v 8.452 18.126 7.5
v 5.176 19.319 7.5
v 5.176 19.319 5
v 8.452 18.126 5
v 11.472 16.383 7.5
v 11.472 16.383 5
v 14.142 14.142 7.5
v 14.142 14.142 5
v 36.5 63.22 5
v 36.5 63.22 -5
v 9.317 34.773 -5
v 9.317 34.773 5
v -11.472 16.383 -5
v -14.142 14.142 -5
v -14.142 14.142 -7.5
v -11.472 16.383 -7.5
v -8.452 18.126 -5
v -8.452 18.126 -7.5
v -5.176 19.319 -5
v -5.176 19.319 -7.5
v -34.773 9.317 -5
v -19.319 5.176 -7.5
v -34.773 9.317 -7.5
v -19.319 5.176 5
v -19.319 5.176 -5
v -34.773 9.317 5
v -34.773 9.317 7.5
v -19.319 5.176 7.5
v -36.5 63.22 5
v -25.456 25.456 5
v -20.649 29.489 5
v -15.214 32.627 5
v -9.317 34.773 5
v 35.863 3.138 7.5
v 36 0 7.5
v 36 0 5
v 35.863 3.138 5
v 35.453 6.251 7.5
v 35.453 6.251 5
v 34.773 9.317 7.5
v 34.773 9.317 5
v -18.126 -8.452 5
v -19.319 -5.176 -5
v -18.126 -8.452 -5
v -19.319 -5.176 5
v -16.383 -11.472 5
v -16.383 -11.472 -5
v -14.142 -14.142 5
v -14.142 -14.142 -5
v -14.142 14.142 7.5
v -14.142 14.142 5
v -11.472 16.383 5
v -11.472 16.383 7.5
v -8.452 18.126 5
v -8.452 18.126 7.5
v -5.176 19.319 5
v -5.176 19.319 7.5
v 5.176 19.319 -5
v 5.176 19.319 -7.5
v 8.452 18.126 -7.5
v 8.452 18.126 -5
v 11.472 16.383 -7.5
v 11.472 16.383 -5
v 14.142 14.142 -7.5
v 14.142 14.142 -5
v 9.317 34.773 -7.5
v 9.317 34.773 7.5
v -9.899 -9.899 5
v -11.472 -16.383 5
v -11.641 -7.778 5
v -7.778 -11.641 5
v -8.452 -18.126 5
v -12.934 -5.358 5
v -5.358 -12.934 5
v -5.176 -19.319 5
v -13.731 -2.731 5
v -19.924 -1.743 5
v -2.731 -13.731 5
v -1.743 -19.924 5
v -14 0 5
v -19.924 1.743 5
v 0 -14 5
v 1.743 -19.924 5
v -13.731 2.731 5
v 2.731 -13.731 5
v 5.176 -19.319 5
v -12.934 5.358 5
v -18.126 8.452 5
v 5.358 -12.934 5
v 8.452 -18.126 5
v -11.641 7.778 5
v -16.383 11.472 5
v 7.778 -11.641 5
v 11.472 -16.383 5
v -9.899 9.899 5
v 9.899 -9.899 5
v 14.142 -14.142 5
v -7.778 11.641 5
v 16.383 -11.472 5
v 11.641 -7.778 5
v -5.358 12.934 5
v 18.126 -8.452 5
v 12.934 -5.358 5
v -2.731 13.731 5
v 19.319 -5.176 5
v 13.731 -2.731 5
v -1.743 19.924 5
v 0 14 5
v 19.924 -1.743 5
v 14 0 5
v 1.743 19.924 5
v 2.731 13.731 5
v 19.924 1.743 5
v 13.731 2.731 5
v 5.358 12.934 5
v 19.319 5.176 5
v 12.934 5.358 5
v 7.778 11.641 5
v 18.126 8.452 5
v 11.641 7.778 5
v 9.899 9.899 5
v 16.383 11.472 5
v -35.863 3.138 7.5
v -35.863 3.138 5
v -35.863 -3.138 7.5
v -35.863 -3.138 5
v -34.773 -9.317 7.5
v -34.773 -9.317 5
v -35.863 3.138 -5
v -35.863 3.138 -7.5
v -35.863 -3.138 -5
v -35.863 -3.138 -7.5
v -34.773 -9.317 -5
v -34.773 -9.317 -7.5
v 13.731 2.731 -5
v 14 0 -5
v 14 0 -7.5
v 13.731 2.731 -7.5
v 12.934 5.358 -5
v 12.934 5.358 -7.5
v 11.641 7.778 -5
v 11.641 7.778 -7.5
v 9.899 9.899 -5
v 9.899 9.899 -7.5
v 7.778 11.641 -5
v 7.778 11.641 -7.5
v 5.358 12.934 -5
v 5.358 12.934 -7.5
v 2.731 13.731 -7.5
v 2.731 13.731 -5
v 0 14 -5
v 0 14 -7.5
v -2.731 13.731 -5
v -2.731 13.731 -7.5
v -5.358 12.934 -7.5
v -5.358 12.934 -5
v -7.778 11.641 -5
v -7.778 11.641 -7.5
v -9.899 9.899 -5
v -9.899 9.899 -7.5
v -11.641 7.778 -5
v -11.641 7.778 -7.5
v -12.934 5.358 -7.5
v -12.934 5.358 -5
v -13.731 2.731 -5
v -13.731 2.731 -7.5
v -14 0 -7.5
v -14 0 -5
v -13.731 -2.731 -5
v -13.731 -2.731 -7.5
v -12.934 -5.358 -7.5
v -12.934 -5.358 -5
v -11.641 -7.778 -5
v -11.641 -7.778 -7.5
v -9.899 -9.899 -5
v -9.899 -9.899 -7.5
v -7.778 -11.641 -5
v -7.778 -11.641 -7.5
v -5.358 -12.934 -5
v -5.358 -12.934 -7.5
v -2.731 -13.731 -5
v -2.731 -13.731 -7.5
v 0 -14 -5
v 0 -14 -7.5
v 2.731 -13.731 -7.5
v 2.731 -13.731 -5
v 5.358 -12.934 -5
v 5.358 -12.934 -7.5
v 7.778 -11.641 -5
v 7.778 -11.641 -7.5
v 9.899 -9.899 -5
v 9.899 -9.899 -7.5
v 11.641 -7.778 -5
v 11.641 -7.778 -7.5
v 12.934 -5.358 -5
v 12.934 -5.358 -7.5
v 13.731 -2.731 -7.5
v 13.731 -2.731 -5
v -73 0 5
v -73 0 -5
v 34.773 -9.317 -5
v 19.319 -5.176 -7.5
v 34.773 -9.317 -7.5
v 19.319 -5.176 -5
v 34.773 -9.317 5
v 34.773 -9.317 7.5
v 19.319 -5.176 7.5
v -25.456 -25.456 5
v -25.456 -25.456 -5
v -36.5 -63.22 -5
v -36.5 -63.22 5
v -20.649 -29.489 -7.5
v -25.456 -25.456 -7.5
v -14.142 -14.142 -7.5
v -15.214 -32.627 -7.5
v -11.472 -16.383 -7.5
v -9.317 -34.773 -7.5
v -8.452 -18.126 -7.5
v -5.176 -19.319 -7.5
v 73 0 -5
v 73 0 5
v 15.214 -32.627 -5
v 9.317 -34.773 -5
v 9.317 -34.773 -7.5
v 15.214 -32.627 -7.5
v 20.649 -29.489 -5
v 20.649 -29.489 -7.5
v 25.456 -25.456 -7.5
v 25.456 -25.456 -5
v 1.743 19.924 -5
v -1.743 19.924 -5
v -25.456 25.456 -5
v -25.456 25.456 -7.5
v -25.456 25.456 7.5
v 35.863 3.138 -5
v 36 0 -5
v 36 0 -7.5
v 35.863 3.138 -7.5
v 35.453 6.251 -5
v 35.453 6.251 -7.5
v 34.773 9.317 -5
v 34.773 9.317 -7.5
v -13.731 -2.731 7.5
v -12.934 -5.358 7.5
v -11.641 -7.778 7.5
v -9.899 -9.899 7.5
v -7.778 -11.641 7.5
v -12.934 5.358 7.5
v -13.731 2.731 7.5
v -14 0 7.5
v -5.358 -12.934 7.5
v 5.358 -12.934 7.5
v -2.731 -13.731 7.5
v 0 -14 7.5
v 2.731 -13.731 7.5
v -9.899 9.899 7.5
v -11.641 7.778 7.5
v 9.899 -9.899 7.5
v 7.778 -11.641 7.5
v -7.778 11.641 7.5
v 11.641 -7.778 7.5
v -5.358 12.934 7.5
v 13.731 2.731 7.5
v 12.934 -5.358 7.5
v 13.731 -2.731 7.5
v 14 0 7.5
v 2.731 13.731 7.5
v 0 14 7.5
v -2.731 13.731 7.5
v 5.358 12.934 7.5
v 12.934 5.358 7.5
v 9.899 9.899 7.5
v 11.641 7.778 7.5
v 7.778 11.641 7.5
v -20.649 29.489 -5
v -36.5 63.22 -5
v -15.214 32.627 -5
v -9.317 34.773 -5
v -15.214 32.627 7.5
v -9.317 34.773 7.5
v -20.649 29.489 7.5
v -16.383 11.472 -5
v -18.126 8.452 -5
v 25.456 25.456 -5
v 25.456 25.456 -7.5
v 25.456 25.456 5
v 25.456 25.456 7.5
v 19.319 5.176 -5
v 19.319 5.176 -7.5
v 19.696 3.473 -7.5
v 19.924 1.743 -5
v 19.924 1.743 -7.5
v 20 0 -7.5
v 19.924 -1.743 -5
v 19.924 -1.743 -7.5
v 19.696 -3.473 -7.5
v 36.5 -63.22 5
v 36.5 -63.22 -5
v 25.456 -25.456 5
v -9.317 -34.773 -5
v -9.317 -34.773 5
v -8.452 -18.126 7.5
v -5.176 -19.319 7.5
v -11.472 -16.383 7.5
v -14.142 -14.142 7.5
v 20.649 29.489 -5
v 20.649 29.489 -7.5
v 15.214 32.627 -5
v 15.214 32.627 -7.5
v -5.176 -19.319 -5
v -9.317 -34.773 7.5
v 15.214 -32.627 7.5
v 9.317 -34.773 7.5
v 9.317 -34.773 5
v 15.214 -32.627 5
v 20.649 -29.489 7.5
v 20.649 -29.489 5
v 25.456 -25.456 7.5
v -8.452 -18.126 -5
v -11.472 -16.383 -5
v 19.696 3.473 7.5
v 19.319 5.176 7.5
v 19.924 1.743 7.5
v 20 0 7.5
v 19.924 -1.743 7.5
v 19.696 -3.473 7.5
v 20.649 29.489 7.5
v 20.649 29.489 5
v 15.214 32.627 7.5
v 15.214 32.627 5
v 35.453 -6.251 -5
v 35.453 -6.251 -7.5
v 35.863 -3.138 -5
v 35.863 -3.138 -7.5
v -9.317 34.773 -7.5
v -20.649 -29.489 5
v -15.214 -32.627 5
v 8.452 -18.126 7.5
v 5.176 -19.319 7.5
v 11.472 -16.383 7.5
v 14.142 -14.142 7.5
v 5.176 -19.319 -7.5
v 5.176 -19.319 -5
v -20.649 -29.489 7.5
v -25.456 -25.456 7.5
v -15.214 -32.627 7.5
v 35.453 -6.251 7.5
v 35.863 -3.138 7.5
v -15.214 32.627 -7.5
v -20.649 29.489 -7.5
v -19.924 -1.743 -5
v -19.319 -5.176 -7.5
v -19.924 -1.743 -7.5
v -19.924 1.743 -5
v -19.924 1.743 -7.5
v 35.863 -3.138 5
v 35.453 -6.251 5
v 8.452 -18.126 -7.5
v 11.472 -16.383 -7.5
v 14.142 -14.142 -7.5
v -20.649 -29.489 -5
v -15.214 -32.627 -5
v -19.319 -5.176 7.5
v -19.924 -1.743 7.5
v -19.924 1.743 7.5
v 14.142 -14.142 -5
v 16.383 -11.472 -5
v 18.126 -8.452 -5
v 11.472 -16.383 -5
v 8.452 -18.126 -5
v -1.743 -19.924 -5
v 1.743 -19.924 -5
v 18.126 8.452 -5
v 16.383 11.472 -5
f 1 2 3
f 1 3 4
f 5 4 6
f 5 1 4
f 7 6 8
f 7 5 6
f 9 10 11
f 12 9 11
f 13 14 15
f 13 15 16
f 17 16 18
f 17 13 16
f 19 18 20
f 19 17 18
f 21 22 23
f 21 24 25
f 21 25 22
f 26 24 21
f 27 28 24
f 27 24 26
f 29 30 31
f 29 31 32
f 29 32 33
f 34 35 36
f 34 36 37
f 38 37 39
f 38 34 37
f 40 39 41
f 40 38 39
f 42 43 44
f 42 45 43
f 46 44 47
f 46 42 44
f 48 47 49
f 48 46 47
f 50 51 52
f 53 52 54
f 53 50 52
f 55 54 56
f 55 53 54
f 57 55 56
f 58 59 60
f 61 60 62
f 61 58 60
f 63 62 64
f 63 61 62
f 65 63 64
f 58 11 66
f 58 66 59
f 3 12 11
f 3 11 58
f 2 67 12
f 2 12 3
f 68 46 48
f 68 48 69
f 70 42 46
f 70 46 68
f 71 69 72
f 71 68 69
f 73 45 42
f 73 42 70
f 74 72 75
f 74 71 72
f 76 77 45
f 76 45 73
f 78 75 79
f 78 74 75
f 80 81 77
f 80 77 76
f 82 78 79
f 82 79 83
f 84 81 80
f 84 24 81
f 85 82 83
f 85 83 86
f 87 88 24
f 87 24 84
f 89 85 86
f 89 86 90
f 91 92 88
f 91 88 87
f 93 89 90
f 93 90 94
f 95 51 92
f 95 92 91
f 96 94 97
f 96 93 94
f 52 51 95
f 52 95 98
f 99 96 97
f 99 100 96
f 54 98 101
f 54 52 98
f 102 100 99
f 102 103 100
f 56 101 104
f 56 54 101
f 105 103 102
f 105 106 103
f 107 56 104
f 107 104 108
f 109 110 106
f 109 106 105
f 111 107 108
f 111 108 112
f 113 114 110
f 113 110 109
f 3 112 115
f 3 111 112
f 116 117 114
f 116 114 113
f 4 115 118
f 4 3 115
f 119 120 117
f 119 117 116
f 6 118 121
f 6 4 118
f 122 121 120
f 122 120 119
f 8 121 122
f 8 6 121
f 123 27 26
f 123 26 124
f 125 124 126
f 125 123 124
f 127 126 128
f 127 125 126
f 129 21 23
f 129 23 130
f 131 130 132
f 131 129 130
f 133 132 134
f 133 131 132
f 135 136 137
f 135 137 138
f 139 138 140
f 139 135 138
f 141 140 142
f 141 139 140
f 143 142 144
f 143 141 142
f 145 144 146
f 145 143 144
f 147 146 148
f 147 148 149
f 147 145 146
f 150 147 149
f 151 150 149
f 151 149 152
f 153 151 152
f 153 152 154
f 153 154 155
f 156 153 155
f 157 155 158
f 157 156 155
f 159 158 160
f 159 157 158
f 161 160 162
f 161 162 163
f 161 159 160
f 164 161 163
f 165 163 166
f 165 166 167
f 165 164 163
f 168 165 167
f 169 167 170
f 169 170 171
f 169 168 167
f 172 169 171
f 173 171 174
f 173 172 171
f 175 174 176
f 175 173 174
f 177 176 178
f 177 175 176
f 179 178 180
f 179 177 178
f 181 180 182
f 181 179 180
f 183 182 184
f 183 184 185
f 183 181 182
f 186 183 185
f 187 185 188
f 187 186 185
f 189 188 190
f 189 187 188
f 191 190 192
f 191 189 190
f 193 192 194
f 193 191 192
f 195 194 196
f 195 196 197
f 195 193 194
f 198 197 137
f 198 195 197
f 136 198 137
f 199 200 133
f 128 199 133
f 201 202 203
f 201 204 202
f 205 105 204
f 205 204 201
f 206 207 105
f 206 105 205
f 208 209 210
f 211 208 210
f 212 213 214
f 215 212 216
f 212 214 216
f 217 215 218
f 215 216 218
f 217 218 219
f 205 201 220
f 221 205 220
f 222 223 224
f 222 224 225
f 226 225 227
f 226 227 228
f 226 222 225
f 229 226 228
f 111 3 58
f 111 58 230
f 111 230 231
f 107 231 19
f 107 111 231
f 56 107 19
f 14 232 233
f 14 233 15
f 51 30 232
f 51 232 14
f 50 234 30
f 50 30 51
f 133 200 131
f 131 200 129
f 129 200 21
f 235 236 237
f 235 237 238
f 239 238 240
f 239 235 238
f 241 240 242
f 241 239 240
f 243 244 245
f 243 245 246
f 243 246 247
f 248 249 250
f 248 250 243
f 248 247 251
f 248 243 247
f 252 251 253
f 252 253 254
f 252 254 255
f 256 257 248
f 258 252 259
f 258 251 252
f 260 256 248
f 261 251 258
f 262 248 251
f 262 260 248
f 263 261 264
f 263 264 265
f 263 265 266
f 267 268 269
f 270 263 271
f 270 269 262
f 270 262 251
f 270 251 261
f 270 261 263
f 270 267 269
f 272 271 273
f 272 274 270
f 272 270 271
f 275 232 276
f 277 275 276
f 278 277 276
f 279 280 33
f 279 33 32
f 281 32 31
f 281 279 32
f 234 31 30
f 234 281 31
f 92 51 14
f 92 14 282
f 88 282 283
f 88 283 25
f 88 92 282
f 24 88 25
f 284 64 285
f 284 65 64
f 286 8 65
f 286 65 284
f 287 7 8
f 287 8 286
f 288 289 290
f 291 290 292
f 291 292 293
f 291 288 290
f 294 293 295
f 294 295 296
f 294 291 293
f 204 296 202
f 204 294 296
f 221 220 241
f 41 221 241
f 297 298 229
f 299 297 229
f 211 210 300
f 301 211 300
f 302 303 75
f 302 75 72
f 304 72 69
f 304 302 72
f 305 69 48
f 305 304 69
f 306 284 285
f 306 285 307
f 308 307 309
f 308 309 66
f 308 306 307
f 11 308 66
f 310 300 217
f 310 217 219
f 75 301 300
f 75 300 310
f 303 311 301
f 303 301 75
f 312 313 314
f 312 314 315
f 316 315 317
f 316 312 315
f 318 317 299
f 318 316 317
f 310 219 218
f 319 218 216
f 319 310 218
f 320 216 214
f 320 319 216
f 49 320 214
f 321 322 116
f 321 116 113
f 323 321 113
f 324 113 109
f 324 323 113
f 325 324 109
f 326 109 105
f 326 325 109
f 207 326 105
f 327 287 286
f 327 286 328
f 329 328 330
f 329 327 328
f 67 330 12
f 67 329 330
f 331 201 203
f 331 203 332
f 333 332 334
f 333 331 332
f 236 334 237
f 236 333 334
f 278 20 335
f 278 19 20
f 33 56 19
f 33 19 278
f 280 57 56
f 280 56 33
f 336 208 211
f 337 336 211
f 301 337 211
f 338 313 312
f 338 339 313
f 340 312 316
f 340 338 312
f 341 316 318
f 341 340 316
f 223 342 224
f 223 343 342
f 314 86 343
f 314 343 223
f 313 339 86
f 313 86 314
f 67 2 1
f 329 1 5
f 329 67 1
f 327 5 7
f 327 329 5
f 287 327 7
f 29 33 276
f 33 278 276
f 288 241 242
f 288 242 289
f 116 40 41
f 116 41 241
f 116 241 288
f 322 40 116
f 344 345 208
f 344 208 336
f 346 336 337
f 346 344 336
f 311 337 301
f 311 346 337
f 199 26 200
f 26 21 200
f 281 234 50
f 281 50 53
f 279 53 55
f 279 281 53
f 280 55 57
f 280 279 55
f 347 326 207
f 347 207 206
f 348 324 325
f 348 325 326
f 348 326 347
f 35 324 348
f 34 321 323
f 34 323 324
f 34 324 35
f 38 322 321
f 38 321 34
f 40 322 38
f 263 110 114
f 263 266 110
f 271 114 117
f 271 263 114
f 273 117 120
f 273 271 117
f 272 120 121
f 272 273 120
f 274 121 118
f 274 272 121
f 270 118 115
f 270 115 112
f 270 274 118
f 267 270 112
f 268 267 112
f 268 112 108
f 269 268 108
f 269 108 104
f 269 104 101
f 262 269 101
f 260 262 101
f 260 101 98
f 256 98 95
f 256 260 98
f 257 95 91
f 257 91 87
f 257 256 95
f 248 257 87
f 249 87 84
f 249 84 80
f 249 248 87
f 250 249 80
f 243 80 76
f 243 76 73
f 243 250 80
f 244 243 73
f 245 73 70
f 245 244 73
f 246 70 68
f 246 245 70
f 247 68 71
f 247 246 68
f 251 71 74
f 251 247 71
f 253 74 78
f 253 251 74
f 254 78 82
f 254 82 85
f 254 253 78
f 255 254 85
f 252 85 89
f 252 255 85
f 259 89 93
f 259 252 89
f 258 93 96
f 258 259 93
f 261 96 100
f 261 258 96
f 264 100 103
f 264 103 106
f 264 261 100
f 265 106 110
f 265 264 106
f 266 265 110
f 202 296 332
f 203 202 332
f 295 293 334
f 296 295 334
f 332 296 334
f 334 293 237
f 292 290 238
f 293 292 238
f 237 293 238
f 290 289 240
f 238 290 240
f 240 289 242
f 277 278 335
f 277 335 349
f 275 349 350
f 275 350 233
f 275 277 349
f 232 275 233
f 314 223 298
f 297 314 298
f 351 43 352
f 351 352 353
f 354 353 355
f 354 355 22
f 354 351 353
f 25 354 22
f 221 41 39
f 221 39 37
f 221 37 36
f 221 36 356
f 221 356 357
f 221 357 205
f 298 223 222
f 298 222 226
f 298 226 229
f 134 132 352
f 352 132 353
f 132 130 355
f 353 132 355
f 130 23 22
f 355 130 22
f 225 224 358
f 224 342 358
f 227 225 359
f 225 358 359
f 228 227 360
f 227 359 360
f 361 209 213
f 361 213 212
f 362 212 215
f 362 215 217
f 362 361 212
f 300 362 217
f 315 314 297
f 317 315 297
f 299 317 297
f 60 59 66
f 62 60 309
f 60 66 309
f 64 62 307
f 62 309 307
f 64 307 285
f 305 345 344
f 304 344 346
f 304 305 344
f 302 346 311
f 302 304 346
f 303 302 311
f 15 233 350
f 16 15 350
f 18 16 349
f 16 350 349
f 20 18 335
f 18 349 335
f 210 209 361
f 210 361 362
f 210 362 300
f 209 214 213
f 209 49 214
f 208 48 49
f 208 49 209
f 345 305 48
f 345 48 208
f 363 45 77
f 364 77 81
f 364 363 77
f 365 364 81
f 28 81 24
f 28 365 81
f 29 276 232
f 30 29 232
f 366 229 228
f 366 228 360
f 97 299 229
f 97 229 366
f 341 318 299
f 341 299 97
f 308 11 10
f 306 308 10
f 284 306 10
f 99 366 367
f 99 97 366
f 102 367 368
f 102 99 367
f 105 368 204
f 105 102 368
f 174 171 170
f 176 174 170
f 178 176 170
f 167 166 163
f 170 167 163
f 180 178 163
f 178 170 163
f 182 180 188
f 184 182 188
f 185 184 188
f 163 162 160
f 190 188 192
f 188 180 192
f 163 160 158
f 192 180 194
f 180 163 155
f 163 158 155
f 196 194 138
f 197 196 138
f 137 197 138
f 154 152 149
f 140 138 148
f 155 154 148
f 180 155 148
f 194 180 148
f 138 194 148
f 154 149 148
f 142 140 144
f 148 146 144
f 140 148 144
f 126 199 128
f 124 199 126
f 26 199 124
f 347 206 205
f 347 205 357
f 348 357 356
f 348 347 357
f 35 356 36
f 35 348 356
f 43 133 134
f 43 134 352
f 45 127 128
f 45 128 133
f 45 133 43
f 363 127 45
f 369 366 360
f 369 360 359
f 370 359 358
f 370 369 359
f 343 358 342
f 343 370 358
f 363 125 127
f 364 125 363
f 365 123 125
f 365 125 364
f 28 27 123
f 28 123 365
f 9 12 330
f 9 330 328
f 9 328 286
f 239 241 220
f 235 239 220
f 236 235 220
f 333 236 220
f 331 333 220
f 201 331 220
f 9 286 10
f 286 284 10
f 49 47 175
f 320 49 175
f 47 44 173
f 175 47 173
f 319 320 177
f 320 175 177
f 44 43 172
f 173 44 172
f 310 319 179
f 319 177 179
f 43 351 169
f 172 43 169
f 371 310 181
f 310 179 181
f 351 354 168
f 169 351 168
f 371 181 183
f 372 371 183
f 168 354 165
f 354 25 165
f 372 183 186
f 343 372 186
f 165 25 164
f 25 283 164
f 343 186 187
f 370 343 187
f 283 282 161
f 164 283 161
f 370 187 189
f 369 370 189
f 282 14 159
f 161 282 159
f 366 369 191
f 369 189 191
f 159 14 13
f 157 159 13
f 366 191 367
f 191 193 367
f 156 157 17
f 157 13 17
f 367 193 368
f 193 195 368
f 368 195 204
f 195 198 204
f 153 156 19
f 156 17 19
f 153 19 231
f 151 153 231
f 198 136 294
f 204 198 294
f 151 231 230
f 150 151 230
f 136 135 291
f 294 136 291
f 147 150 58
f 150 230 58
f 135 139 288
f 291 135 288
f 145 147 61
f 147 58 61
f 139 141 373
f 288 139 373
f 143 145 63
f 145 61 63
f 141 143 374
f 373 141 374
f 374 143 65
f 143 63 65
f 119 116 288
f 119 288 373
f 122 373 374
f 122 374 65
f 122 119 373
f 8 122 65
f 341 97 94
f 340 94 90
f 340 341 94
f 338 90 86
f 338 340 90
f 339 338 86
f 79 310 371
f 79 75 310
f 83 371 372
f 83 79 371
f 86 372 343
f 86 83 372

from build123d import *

# Parameters (mm, degrees)
BOSS_EXTRUDE1_DEPTH   = 7.5
BOSS_EXTRUDE1_2_DEPTH = 7.5
BOSS_EXTRUDE1_3_DEPTH = 7.5
BOSS_EXTRUDE1_4_DEPTH = 7.5
BOSS_EXTRUDE1_5_DEPTH = 7.5
BOSS_EXTRUDE1_6_DEPTH = 7.5
SKETCH1_R             = 14
BOSS_EXTRUDE1_7_DEPTH = 7.5
SKETCH1_3_R           = 20
SKETCH1_3_R_2         = 14
BOSS_EXTRUDE2_DEPTH   = 5


with BuildPart() as part:
    # Sketch1 → Boss-Extrude1 (new, symmetric)
    with BuildSketch(Plane.XY):
        with BuildLine():
            ThreePointArc((34.773329746, -9.317485624), (36, 0), (34.773329746, 9.317485624))
            Line((34.773329746, 9.317485624), (19.318516526, 5.176380902))
            ThreePointArc((19.318516526, 5.176380902), (20, 0), (19.318516526, -5.176380902))
            Line((19.318516526, -5.176380902), (34.773329746, -9.317485624))
        make_face()
    extrude(amount=BOSS_EXTRUDE1_DEPTH, both=True)



with BuildPart() as body_2:
    # Sketch1 → Boss-Extrude1 2 (new, symmetric)
    with BuildSketch(Plane.XY):
        with BuildLine():
            Line((14.142135624, 14.142135624), (25.455844123, 25.455844123))
            ThreePointArc((25.455844123, 25.455844123), (18, 31.176914536), (9.317485624, 34.773329746))
            Line((9.317485624, 34.773329746), (5.176380902, 19.318516526))
            ThreePointArc((5.176380902, 19.318516526), (10, 17.320508076), (14.142135624, 14.142135624))
        make_face()
    extrude(amount=BOSS_EXTRUDE1_2_DEPTH, both=True)


with BuildPart() as body_3:
    # Sketch1 → Boss-Extrude1 3 (new, symmetric)
    with BuildSketch(Plane.XY):
        with BuildLine():
            ThreePointArc((9.317485624, -34.773329746), (18, -31.176914536), (25.455844123, -25.455844123))
            Line((25.455844123, -25.455844123), (14.142135624, -14.142135624))
            ThreePointArc((14.142135624, -14.142135624), (10, -17.320508076), (5.176380902, -19.318516526))
            Line((5.176380902, -19.318516526), (9.317485624, -34.773329746))
        make_face()
    extrude(amount=BOSS_EXTRUDE1_3_DEPTH, both=True)


with BuildPart() as body_4:
    # Sketch1 → Boss-Extrude1 4 (new, symmetric)
    with BuildSketch(Plane.XY):
        with BuildLine():
            Line((-5.176380902, 19.318516526), (-9.317485624, 34.773329746))
            ThreePointArc((-9.317485624, 34.773329746), (-18, 31.176914536), (-25.455844123, 25.455844123))
            Line((-25.455844123, 25.455844123), (-14.142135624, 14.142135624))
            ThreePointArc((-14.142135624, 14.142135624), (-10, 17.320508076), (-5.176380902, 19.318516526))
        make_face()
    extrude(amount=BOSS_EXTRUDE1_4_DEPTH, both=True)


with BuildPart() as body_5:
    # Sketch1 → Boss-Extrude1 5 (new, symmetric)
    with BuildSketch(Plane.XY):
        with BuildLine():
            ThreePointArc((-25.455844123, -25.455844123), (-18, -31.176914536), (-9.317485624, -34.773329746))
            Line((-9.317485624, -34.773329746), (-5.176380902, -19.318516526))
            ThreePointArc((-5.176380902, -19.318516526), (-10, -17.320508076), (-14.142135624, -14.142135624))
            Line((-14.142135624, -14.142135624), (-25.455844123, -25.455844123))
        make_face()
    extrude(amount=BOSS_EXTRUDE1_5_DEPTH, both=True)


with BuildPart() as body_6:
    # Sketch1 → Boss-Extrude1 6 (new, symmetric)
    with BuildSketch(Plane.XY):
        with BuildLine():
            Line((-19.318516526, 5.176380902), (-34.773329746, 9.317485624))
            ThreePointArc((-34.773329746, 9.317485624), (-36, 0), (-34.773329746, -9.317485624))
            Line((-34.773329746, -9.317485624), (-19.318516526, -5.176380902))
            ThreePointArc((-19.318516526, -5.176380902), (-20, 0), (-19.318516526, 5.176380902))
        make_face()
    extrude(amount=BOSS_EXTRUDE1_6_DEPTH, both=True)


with BuildPart() as body_7:
    # Sketch1 → Boss-Extrude1 7 (new, symmetric)
    with BuildSketch(Plane.XY):
        Circle(SKETCH1_R)
    extrude(amount=BOSS_EXTRUDE1_7_DEPTH, both=True)


with BuildPart() as part_1:
    add(part.part)

    add(body_2.part)  # Boss-Extrude2 merges body 2

    add(body_3.part)  # Boss-Extrude2 merges body 3

    add(body_4.part)  # Boss-Extrude2 merges body 4

    add(body_5.part)  # Boss-Extrude2 merges body 5

    add(body_6.part)  # Boss-Extrude2 merges body 6

    add(body_7.part)  # Boss-Extrude2 merges body 7
    # Sketch1<3> → Boss-Extrude2 (add, symmetric)
    # profile 1 of 7: a face of its own
    with BuildSketch(Plane.XY):
        with BuildLine():
            Line((73, 0), (34.773329746, 9.317485624))
            ThreePointArc((34.773329746, 9.317485624), (36, 0), (34.773329746, -9.317485624))
            Line((34.773329746, -9.317485624), (73, 0))
        make_face()
    # profile 2 of 7: a face of its own
    with BuildSketch(Plane.XY):
        Circle(SKETCH1_3_R)
        Circle(SKETCH1_3_R_2, mode=Mode.SUBTRACT)
    # profile 3 of 7: a face of its own
    with BuildSketch(Plane.XY):
        with BuildLine():
            ThreePointArc((9.317485624, 34.773329746), (18, 31.176914536), (25.455844123, 25.455844123))
            Line((25.455844123, 25.455844123), (36.5, 63.219854476))
            Line((36.5, 63.219854476), (9.317485624, 34.773329746))
        make_face()
    # profile 4 of 7: a face of its own
    with BuildSketch(Plane.XY):
        with BuildLine():
            Line((36.5, -63.219854476), (25.455844123, -25.455844123))
            ThreePointArc((25.455844123, -25.455844123), (18, -31.176914536), (9.317485624, -34.773329746))
            Line((9.317485624, -34.773329746), (36.5, -63.219854476))
        make_face()
    # profile 5 of 7: a face of its own
    with BuildSketch(Plane.XY):
        with BuildLine():
            ThreePointArc((-25.455844123, 25.455844123), (-18, 31.176914536), (-9.317485624, 34.773329746))
            Line((-9.317485624, 34.773329746), (-36.5, 63.219854476))
            Line((-36.5, 63.219854476), (-25.455844123, 25.455844123))
        make_face()
    # profile 6 of 7: a face of its own
    with BuildSketch(Plane.XY):
        with BuildLine():
            Line((-36.5, -63.219854476), (-9.317485624, -34.773329746))
            ThreePointArc((-9.317485624, -34.773329746), (-18, -31.176914536), (-25.455844123, -25.455844123))
            Line((-25.455844123, -25.455844123), (-36.5, -63.219854476))
        make_face()
    # profile 7 of 7: a face of its own
    with BuildSketch(Plane.XY):
        with BuildLine():
            ThreePointArc((-34.773329746, -9.317485624), (-36, 0), (-34.773329746, 9.317485624))
            Line((-34.773329746, 9.317485624), (-73, 0))
            Line((-73, 0), (-34.773329746, -9.317485624))
        make_face()
    extrude(amount=BOSS_EXTRUDE2_DEPTH, both=True)


solid = part_1.part
